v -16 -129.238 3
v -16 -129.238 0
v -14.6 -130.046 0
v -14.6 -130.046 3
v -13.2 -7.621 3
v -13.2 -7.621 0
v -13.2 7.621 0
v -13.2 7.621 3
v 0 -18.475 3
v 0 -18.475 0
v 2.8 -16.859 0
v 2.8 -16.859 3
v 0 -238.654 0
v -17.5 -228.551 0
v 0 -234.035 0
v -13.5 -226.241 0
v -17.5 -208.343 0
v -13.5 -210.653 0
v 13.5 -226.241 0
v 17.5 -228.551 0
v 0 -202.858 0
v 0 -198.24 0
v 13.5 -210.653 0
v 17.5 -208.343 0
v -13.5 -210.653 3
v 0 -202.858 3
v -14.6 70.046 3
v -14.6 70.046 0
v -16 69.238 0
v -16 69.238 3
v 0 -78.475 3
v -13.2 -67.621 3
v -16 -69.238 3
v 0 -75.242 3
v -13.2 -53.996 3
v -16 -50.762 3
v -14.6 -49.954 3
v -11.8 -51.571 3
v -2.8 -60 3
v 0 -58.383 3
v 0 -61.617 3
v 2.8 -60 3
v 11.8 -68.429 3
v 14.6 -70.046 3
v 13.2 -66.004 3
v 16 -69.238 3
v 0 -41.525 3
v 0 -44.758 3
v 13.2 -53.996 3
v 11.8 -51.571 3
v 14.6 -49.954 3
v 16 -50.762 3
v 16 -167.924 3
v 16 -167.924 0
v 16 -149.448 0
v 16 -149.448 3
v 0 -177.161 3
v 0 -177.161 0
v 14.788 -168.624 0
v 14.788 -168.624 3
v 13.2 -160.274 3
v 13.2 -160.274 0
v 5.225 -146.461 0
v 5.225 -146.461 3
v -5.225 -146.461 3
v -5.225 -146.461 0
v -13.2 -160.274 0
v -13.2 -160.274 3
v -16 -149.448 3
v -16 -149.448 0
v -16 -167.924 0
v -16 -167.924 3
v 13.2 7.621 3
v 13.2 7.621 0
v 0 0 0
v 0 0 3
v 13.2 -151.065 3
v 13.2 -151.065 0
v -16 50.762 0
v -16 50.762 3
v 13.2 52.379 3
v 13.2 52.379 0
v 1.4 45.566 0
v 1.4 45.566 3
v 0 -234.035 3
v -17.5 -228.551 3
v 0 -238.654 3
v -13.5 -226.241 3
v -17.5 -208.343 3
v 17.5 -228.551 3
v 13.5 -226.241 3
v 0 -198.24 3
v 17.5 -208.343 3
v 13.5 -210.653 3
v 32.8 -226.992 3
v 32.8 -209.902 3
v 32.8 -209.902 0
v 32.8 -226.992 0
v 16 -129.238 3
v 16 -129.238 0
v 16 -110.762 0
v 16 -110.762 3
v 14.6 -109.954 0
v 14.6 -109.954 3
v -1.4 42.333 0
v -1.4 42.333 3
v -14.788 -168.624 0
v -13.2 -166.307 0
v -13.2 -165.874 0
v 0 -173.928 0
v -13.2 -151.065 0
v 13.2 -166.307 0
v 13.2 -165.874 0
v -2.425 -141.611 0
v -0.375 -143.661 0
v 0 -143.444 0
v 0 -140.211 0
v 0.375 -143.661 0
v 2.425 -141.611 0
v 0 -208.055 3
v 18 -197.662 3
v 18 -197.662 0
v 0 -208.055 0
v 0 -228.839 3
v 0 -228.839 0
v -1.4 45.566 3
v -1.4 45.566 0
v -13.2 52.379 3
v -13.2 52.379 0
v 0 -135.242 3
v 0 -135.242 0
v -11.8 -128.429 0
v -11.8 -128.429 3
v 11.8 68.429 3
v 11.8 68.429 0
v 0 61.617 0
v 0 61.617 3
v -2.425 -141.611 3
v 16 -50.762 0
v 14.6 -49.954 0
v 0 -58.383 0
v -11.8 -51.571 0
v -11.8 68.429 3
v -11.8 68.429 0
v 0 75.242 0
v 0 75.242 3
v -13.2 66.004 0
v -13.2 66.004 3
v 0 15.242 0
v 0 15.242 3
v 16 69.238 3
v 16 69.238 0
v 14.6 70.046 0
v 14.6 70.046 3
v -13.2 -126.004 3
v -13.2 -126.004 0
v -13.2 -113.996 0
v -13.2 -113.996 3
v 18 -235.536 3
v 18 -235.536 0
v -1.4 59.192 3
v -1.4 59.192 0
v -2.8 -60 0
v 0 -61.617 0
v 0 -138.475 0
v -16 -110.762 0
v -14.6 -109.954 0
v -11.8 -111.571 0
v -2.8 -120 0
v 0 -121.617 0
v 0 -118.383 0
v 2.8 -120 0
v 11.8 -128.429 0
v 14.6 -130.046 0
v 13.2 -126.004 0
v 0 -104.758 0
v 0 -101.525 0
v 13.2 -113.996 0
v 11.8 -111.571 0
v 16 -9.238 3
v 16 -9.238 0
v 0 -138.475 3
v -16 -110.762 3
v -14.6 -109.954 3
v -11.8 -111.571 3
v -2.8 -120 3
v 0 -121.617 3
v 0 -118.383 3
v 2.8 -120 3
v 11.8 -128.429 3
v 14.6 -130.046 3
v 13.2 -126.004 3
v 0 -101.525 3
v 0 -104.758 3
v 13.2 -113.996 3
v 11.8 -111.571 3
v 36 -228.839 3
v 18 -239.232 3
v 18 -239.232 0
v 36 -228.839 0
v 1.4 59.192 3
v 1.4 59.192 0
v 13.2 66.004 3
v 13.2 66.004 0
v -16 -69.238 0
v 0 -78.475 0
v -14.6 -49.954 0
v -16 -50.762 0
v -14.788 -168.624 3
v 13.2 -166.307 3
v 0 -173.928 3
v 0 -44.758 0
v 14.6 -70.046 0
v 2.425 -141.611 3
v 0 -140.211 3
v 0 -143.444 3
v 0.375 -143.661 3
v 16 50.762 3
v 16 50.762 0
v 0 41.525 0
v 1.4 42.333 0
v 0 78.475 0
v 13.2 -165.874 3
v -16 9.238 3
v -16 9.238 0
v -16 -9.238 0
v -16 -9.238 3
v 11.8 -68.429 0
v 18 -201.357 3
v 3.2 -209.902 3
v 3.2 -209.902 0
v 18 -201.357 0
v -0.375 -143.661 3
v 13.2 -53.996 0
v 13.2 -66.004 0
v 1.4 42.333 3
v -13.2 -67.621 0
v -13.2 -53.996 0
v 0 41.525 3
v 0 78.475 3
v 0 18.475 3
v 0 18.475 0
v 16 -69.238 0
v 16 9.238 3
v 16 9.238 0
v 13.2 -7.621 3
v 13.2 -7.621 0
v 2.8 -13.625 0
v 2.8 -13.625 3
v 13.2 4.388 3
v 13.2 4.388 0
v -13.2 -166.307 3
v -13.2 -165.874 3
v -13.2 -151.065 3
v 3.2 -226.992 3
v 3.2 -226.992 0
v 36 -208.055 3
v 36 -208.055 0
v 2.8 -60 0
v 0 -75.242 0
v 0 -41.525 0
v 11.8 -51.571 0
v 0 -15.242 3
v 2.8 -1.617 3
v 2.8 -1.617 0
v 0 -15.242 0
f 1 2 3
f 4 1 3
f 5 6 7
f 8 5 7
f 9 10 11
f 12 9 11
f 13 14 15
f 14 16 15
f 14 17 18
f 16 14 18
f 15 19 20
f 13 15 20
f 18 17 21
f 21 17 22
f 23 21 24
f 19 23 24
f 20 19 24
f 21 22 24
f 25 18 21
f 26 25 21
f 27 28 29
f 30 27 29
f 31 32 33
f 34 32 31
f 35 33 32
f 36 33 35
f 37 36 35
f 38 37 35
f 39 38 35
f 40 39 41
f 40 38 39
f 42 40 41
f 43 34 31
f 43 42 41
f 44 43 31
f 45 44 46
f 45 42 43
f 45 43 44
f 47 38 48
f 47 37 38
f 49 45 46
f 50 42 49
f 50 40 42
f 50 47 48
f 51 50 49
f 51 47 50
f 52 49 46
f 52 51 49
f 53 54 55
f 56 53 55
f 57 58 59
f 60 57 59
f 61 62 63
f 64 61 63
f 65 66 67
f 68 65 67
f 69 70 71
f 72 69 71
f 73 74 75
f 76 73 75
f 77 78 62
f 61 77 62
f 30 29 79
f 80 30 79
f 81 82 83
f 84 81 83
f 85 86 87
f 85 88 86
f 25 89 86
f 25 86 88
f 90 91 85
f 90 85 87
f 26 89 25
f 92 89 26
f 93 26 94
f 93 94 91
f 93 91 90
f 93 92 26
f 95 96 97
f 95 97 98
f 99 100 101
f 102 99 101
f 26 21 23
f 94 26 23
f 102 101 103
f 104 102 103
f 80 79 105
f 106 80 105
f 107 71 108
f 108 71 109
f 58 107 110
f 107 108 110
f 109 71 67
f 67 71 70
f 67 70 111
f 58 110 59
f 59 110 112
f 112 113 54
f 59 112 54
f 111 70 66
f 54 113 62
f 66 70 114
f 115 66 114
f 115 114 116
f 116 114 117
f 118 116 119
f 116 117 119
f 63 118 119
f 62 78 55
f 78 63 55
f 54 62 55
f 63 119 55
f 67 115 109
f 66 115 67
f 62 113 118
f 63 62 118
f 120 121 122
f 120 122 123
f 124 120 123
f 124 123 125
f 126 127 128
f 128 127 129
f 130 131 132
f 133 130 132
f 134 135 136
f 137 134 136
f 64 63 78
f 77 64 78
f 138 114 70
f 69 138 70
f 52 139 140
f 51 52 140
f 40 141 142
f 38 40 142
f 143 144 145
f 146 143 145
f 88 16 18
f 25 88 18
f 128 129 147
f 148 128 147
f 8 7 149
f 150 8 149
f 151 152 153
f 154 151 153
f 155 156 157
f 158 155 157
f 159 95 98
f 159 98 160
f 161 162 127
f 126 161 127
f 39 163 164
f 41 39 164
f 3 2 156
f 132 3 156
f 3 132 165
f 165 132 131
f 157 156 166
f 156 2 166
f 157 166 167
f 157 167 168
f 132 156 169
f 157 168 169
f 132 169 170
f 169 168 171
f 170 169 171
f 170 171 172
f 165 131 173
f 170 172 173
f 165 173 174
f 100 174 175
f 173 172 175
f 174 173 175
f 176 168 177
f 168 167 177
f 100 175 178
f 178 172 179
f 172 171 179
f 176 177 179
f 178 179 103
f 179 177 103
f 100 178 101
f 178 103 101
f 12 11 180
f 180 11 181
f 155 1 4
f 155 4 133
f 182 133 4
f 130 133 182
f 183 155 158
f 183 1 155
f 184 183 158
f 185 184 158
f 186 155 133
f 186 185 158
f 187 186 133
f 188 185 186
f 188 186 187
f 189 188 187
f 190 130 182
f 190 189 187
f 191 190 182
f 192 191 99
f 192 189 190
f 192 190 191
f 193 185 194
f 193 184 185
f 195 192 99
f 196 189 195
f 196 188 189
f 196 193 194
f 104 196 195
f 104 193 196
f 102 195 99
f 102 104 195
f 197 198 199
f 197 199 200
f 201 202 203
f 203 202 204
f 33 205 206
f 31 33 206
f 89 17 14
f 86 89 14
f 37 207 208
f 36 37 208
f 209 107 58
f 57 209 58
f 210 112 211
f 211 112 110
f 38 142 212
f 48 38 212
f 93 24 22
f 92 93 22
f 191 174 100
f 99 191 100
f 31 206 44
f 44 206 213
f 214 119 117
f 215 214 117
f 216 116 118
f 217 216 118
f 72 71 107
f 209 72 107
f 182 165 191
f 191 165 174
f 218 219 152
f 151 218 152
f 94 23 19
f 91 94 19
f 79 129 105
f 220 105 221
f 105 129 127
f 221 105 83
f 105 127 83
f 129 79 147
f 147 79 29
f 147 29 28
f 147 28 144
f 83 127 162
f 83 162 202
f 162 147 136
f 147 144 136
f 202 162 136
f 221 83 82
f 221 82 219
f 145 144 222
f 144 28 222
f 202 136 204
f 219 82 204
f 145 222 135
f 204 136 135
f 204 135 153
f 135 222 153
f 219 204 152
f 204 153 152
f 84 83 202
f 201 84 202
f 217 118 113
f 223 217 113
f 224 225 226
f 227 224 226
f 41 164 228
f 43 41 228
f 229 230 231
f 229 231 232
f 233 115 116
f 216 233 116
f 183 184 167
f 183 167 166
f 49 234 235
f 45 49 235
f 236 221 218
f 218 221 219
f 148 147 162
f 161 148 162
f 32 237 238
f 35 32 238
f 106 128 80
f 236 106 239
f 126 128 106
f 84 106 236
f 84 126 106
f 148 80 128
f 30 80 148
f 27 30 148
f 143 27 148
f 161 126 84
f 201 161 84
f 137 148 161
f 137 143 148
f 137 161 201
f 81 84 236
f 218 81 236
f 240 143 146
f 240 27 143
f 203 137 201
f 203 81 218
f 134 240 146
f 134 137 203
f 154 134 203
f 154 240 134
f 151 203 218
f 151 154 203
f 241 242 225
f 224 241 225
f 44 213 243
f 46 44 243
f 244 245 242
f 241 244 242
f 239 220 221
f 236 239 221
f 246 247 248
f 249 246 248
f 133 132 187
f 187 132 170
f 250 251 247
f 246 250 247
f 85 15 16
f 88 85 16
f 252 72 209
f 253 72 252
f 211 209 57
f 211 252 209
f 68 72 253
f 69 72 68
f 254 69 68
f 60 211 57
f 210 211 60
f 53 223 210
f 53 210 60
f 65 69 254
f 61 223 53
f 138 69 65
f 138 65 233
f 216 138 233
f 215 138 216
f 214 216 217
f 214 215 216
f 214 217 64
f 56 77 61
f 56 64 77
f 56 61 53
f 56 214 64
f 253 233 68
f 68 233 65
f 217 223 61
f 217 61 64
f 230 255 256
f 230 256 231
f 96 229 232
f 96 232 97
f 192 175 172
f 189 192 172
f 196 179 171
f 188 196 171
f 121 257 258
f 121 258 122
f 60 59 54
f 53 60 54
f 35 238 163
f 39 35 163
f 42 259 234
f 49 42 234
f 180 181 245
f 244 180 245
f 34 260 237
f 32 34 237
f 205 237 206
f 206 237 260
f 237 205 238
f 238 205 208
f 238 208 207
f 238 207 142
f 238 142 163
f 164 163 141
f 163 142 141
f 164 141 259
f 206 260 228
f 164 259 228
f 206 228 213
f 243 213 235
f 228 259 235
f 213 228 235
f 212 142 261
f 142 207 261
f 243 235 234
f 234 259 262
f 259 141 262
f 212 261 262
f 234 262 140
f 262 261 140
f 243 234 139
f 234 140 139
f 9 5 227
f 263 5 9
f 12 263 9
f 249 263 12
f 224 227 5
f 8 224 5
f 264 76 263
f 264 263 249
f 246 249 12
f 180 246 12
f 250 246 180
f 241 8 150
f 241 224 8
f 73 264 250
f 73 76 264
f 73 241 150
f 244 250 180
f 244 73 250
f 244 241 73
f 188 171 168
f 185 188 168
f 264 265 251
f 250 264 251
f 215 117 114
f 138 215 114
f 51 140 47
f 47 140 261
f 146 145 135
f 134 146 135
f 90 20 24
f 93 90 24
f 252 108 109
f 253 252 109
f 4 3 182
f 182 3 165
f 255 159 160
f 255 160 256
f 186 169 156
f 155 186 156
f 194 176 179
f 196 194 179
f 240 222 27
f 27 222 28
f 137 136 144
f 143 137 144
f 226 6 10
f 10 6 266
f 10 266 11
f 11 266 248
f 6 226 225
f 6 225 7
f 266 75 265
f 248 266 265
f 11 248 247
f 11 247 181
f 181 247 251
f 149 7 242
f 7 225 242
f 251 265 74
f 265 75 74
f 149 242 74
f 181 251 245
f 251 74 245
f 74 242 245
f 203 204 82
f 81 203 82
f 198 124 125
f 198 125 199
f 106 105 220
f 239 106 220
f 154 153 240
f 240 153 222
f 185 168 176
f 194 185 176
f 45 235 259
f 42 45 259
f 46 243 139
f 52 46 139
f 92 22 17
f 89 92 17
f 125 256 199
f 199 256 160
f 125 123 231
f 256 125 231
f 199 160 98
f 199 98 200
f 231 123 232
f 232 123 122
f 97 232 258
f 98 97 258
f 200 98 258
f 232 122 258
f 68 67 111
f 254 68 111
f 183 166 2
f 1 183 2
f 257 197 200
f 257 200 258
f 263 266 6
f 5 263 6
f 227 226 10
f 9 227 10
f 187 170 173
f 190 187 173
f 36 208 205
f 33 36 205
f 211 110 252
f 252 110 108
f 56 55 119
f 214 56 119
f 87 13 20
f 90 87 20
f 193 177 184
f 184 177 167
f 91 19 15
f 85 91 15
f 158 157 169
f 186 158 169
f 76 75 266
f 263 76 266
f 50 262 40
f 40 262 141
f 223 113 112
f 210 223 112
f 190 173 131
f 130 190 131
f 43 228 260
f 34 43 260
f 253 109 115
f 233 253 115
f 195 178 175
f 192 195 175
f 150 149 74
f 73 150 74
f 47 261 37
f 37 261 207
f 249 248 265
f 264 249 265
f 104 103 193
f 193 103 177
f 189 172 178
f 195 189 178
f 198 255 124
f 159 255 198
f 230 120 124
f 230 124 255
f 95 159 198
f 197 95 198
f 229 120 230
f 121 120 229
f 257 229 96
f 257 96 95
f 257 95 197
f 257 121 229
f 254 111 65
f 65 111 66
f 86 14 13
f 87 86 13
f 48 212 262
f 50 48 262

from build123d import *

# Parameters (mm, degrees)
F1_DEPTH  = 3
F3_DEPTH  = 3
F5_DEPTH  = 3
F7_DEPTH  = 3
F9_DEPTH  = 3
F11_DEPTH = 3
F13_DEPTH = 3


with BuildPart() as f1:
    # F0 (on Top) → F1 (new body)
    with BuildSketch(Plane.XY):
        Polygon((13.2, 7.6210235533), (16, 9.237604307), (0, 18.4752086141), (-16, 9.237604307), (-16, -9.237604307), (0, -18.4752086141), (0, -15.2420471066), (-13.2, -7.6210235533), (-13.2, 7.6210235533), (0, 15.2420471066), align=None)
        Polygon((16, 6.0044427996), (16, 9.237604307), (13.2, 7.6210235533), (13.2, 4.3878620458), align=None)
        Polygon((16, -9.237604307), (16, 6.0044427996), (13.2, 4.3878620458), (13.2, -7.6210235533), (2.8, -13.6254663529), (2.8, -16.8586278603), align=None)
        Polygon((0, -18.4752086141), (2.8, -16.8586278603), (2.8, -13.6254663529), (0, -15.2420471066), align=None)
        Polygon((13.2, 4.3878620458), (13.2, 7.6210235533), (0, 0), (0, -15.2420471066), (2.8, -13.6254663529), (2.8, -1.6165807537), align=None)
    extrude(amount=F1_DEPTH)


with BuildPart() as f3:
    # F2 (on Top) → F3 (new body)
    with BuildSketch(Plane.XY):
        Polygon((13.2, -52.3789764467), (16, -50.762395693), (14.6, -49.9541053161), (11.8, -51.5706860698), align=None)
        Polygon((16, -52.3789764467), (16, -50.762395693), (13.2, -52.3789764467), (13.2, -53.9955572004), align=None)
        Polygon((16, -67.6210235533), (16, -52.3789764467), (13.2, -53.9955572004), (13.2, -66.0044427996), align=None)
        Polygon((11.8, -51.5706860698), (14.6, -49.9541053161), (0, -41.5247913859), (-14.6, -49.9541053161), (-11.8, -51.5706860698), (0, -44.7579528934), align=None)
        Polygon((16, -69.237604307), (16, -67.6210235533), (13.2, -66.0044427996), (13.2, -67.6210235533), align=None)
        Polygon((14.6, -70.0458946839), (16, -69.237604307), (13.2, -67.6210235533), (11.8, -68.4293139302), align=None)
        Polygon((-11.8, -51.5706860698), (-14.6, -49.9541053161), (-16, -50.762395693), (-13.2, -52.3789764467), align=None)
        Polygon((0, -78.4752086141), (14.6, -70.0458946839), (11.8, -68.4293139302), (0, -75.2420471066), (-13.2, -67.6210235533), (-13.2, -53.9955572004), (-16, -52.3789764467), (-16, -69.237604307), align=None)
        Polygon((-13.2, -52.3789764467), (-16, -50.762395693), (-16, -52.3789764467), (-13.2, -53.9955572004), align=None)
        Polygon((0, -60), (1.4, -59.1917096231), (0, -58.3834192463), (-1.4, -59.1917096231), align=None)
        Polygon((1.4, -60.8082903769), (0, -60), (-1.4, -59.1917096231), (-2.8, -60), (0, -61.6165807537), align=None)
        Polygon((13.2, -67.6210235533), (13.2, -66.0044427996), (2.8, -60), (1.4, -60.8082903769), align=None)
        Polygon((2.8, -60), (1.4, -59.1917096231), (0, -60), (1.4, -60.8082903769), align=None)
        Polygon((13.2, -53.9955572004), (13.2, -52.3789764467), (1.4, -59.1917096231), (2.8, -60), align=None)
        Polygon((1.4, -59.1917096231), (13.2, -52.3789764467), (11.8, -51.5706860698), (0, -58.3834192463), align=None)
        Polygon((11.8, -68.4293139302), (13.2, -67.6210235533), (1.4, -60.8082903769), (0, -61.6165807537), align=None)
        Polygon((-2.8, -60), (-1.4, -59.1917096231), (-13.2, -52.3789764467), (-13.2, -53.9955572004), align=None)
        Polygon((-1.4, -59.1917096231), (0, -58.3834192463), (-11.8, -51.5706860698), (-13.2, -52.3789764467), align=None)
    extrude(amount=F3_DEPTH)


with BuildPart() as f5:
    # F4 (on Top) → F5 (new body)
    with BuildSketch(Plane.XY):
        Polygon((11.8, 68.4293139302), (14.6, 70.0458946839), (0, 78.4752086141), (-14.6, 70.0458946839), (-11.8, 68.4293139302), (0, 75.2420471066), align=None)
        Polygon((-11.8, 68.4293139302), (-14.6, 70.0458946839), (-16, 69.237604307), (-13.2, 67.6210235533), align=None)
        Polygon((-13.2, 66.0044427996), (-13.2, 67.6210235533), (-16, 69.237604307), (-16, 67.6210235533), align=None)
        Polygon((0, 58.3834192463), (0, 60), (-13.2, 67.6210235533), (-13.2, 66.0044427996), (-1.4, 59.1917096231), align=None)
        Polygon((0, 60), (13.2, 67.6210235533), (11.8, 68.4293139302), (0, 61.6165807537), (-11.8, 68.4293139302), (-13.2, 67.6210235533), align=None)
        Polygon((-13.2, 52.3789764467), (-13.2, 66.0044427996), (-16, 67.6210235533), (-16, 50.762395693), (-1.4, 42.3330817628), (-1.4, 45.5662432703), align=None)
        Polygon((0, 44.7579528934), (0, 58.3834192463), (-1.4, 59.1917096231), (-1.4, 45.5662432703), align=None)
        Polygon((1.4, 45.5662432703), (1.4, 59.1917096231), (0, 58.3834192463), (0, 44.7579528934), align=None)
        Polygon((-1.4, 42.3330817628), (0, 41.5247913859), (0, 44.7579528934), (-1.4, 45.5662432703), align=None)
        Polygon((0, 41.5247913859), (1.4, 42.3330817628), (1.4, 45.5662432703), (0, 44.7579528934), align=None)
        Polygon((16, 50.762395693), (16, 67.6210235533), (13.2, 66.0044427996), (13.2, 52.3789764467), (1.4, 45.5662432703), (1.4, 42.3330817628), align=None)
        Polygon((13.2, 66.0044427996), (13.2, 67.6210235533), (0, 60), (0, 58.3834192463), (1.4, 59.1917096231), align=None)
        Polygon((16, 67.6210235533), (16, 69.237604307), (13.2, 67.6210235533), (13.2, 66.0044427996), align=None)
        Polygon((13.2, 67.6210235533), (16, 69.237604307), (14.6, 70.0458946839), (11.8, 68.4293139302), align=None)
    extrude(amount=F5_DEPTH)


with BuildPart() as f7:
    # F6 (on Top) → F7 (new body)
    with BuildSketch(Plane.XY):
        Polygon((16, -127.6210235533), (16, -112.3789764467), (13.2, -113.9955572004), (13.2, -126.0044427996), align=None)
        Polygon((0, -138.4752086141), (14.6, -130.0458946839), (11.8, -128.4293139302), (0, -135.2420471066), (-11.8, -128.4293139302), (-14.6, -130.0458946839), align=None)
        Polygon((-13.2, -113.9955572004), (-16, -112.3789764467), (-16, -127.6210235533), (-13.2, -126.0044427996), align=None)
        Polygon((11.8, -111.5706860698), (14.6, -109.9541053161), (0, -101.5247913859), (-14.6, -109.9541053161), (-11.8, -111.5706860698), (0, -104.7579528934), align=None)
        Polygon((16, -112.3789764467), (16, -110.762395693), (13.2, -112.3789764467), (13.2, -113.9955572004), align=None)
        Polygon((16, -129.237604307), (16, -127.6210235533), (13.2, -126.0044427996), (13.2, -127.6210235533), align=None)
        Polygon((14.6, -130.0458946839), (16, -129.237604307), (13.2, -127.6210235533), (11.8, -128.4293139302), align=None)
        Polygon((-11.8, -128.4293139302), (-13.2, -127.6210235533), (-16, -129.237604307), (-14.6, -130.0458946839), align=None)
        Polygon((-16, -129.237604307), (-13.2, -127.6210235533), (-13.2, -126.0044427996), (-16, -127.6210235533), align=None)
        Polygon((-13.2, -112.3789764467), (-16, -110.762395693), (-16, -112.3789764467), (-13.2, -113.9955572004), align=None)
        Polygon((-11.8, -111.5706860698), (-14.6, -109.9541053161), (-16, -110.762395693), (-13.2, -112.3789764467), align=None)
        Polygon((13.2, -112.3789764467), (16, -110.762395693), (14.6, -109.9541053161), (11.8, -111.5706860698), align=None)
        Polygon((-13.2, -127.6210235533), (-1.4, -120.8082903769), (-2.8, -120), (-13.2, -126.0044427996), align=None)
        Polygon((0, -121.6165807537), (-1.4, -120.8082903769), (-13.2, -127.6210235533), (-11.8, -128.4293139302), align=None)
        Polygon((-2.8, -120), (-1.4, -119.1917096231), (-13.2, -112.3789764467), (-13.2, -113.9955572004), align=None)
        Polygon((-1.4, -119.1917096231), (0, -118.3834192463), (-11.8, -111.5706860698), (-13.2, -112.3789764467), align=None)
        Polygon((0, -120), (1.4, -119.1917096231), (0, -118.3834192463), (-1.4, -119.1917096231), align=None)
        Polygon((-1.4, -120.8082903769), (0, -120), (-1.4, -119.1917096231), (-2.8, -120), align=None)
        Polygon((1.4, -120.8082903769), (0, -120), (-1.4, -120.8082903769), (0, -121.6165807537), align=None)
        Polygon((2.8, -120), (1.4, -119.1917096231), (0, -120), (1.4, -120.8082903769), align=None)
        Polygon((13.2, -127.6210235533), (13.2, -126.0044427996), (2.8, -120), (1.4, -120.8082903769), align=None)
        Polygon((11.8, -128.4293139302), (13.2, -127.6210235533), (1.4, -120.8082903769), (0, -121.6165807537), align=None)
        Polygon((13.2, -113.9955572004), (13.2, -112.3789764467), (1.4, -119.1917096231), (2.8, -120), align=None)
        Polygon((1.4, -119.1917096231), (13.2, -112.3789764467), (11.8, -111.5706860698), (0, -118.3834192463), align=None)
    extrude(amount=F7_DEPTH)


with BuildPart() as f9:
    # F8 (on Top) → F9 (new body)
    with BuildSketch(Plane.XY):
        Polygon((-5.2248711306, -146.4605912422), (-2.4248711306, -141.610848981), (-16, -149.4484532881), (-16, -165.1236619021), (-13.2, -160.2739196409), (-13.2, -151.0650340418), align=None)
        Polygon((-0.8082903769, -141.610848981), (-1.2124355653, -140.910848981), (-2.4248711306, -141.610848981), (-5.2248711306, -146.4605912422), (-2.8, -145.0605912422), align=None)
        Polygon((-0.8082903769, -141.610848981), (0, -140.210848981), (-1.2124355653, -140.910848981), align=None)
        Polygon((0.8082903769, -141.610848981), (0, -140.210848981), (-0.8082903769, -141.610848981), (0, -143.010848981), align=None)
        Polygon((0, -143.010848981), (-0.8082903769, -141.610848981), (-2.8, -145.0605912422), (-0.3751288694, -143.6605912422), align=None)
        Polygon((0.3751288694, -143.6605912422), (0, -143.010848981), (-0.3751288694, -143.6605912422), (0, -143.4440104885), align=None)
        Polygon((2.8, -145.0605912422), (0.8082903769, -141.610848981), (0, -143.010848981), (0.3751288694, -143.6605912422), align=None)
        Polygon((5.2248711306, -146.4605912422), (2.4248711306, -141.610848981), (1.2124355653, -140.910848981), (0.8082903769, -141.610848981), (2.8, -145.0605912422), align=None)
        Polygon((0.8082903769, -141.610848981), (1.2124355653, -140.910848981), (0, -140.210848981), align=None)
        Polygon((16, -165.1236619021), (16, -149.4484532881), (2.4248711306, -141.610848981), (5.2248711306, -146.4605912422), (13.2, -151.0650340418), (13.2, -160.2739196409), align=None)
        Polygon((13.2, -165.8739196409), (13.2, -163.0739196409), (2.8, -145.0605912422), (0.3751288694, -143.6605912422), align=None)
        Polygon((-0.3751288694, -143.6605912422), (-2.8, -145.0605912422), (-13.2, -163.0739196409), (-13.2, -165.8739196409), align=None)
        Polygon((-13.2, -163.0739196409), (-2.8, -145.0605912422), (-5.2248711306, -146.4605912422), (-13.2, -160.2739196409), align=None)
        Polygon((13.2, -163.0739196409), (13.2, -160.2739196409), (5.2248711306, -146.4605912422), (2.8, -145.0605912422), align=None)
        Polygon((16, -167.9236619021), (16, -165.1236619021), (13.2, -160.2739196409), (13.2, -163.0739196409), align=None)
        Polygon((14.7875644347, -168.6236619021), (16, -167.9236619021), (13.2, -163.0739196409), (13.2, -165.8739196409), align=None)
        Polygon((0, -177.1612662092), (14.7875644347, -168.6236619021), (13.2, -165.8739196409), (13.2, -166.3070811484), (0, -173.9281047017), (-13.2, -166.3070811484), (-13.2, -165.8739196409), (-14.7875644347, -168.6236619021), align=None)
        Polygon((-16, -167.9236619021), (-14.7875644347, -168.6236619021), (-13.2, -165.8739196409), (-13.2, -163.0739196409), align=None)
        Polygon((-16, -165.1236619021), (-16, -167.9236619021), (-13.2, -163.0739196409), (-13.2, -160.2739196409), align=None)
    extrude(amount=F9_DEPTH)


with BuildPart() as f11:
    # F10 (on Top) → F11 (new body)
    with BuildSketch(Plane.XY):
        Polygon((17.5, -228.550556477), (17.5, -208.3432970553), (0, -198.2396673445), (-17.5, -208.3432970553), (-17.5, -228.550556477), (0, -238.6541861878), align=None)
        Polygon((-13.5, -226.2411554002), (-13.5, -210.6526981321), (0, -202.858469498), (13.5, -210.6526981321), (13.5, -226.2411554002), (0, -234.0353840343), align=None, mode=Mode.SUBTRACT)
    extrude(amount=F11_DEPTH)


with BuildPart() as f13:
    # F12 (on face) → F13 (new body)
    with BuildSketch(Plane.XY.offset(3)):
        Polygon((0, -208.0546219208), (0, -228.8392316116), (18, -239.231536457), (36, -228.8392316116), (36, -208.0546219208), (18, -197.6623170753), align=None)
        Polygon((18, -235.5364947342), (3.2, -226.9917107502), (3.2, -209.9021427822), (18, -201.3573587982), (32.8, -209.9021427822), (32.8, -226.9917107502), align=None, mode=Mode.SUBTRACT)
    extrude(amount=-F13_DEPTH)


solid = Compound([f1.part, f3.part, f5.part, f7.part, f9.part, f11.part, f13.part])
